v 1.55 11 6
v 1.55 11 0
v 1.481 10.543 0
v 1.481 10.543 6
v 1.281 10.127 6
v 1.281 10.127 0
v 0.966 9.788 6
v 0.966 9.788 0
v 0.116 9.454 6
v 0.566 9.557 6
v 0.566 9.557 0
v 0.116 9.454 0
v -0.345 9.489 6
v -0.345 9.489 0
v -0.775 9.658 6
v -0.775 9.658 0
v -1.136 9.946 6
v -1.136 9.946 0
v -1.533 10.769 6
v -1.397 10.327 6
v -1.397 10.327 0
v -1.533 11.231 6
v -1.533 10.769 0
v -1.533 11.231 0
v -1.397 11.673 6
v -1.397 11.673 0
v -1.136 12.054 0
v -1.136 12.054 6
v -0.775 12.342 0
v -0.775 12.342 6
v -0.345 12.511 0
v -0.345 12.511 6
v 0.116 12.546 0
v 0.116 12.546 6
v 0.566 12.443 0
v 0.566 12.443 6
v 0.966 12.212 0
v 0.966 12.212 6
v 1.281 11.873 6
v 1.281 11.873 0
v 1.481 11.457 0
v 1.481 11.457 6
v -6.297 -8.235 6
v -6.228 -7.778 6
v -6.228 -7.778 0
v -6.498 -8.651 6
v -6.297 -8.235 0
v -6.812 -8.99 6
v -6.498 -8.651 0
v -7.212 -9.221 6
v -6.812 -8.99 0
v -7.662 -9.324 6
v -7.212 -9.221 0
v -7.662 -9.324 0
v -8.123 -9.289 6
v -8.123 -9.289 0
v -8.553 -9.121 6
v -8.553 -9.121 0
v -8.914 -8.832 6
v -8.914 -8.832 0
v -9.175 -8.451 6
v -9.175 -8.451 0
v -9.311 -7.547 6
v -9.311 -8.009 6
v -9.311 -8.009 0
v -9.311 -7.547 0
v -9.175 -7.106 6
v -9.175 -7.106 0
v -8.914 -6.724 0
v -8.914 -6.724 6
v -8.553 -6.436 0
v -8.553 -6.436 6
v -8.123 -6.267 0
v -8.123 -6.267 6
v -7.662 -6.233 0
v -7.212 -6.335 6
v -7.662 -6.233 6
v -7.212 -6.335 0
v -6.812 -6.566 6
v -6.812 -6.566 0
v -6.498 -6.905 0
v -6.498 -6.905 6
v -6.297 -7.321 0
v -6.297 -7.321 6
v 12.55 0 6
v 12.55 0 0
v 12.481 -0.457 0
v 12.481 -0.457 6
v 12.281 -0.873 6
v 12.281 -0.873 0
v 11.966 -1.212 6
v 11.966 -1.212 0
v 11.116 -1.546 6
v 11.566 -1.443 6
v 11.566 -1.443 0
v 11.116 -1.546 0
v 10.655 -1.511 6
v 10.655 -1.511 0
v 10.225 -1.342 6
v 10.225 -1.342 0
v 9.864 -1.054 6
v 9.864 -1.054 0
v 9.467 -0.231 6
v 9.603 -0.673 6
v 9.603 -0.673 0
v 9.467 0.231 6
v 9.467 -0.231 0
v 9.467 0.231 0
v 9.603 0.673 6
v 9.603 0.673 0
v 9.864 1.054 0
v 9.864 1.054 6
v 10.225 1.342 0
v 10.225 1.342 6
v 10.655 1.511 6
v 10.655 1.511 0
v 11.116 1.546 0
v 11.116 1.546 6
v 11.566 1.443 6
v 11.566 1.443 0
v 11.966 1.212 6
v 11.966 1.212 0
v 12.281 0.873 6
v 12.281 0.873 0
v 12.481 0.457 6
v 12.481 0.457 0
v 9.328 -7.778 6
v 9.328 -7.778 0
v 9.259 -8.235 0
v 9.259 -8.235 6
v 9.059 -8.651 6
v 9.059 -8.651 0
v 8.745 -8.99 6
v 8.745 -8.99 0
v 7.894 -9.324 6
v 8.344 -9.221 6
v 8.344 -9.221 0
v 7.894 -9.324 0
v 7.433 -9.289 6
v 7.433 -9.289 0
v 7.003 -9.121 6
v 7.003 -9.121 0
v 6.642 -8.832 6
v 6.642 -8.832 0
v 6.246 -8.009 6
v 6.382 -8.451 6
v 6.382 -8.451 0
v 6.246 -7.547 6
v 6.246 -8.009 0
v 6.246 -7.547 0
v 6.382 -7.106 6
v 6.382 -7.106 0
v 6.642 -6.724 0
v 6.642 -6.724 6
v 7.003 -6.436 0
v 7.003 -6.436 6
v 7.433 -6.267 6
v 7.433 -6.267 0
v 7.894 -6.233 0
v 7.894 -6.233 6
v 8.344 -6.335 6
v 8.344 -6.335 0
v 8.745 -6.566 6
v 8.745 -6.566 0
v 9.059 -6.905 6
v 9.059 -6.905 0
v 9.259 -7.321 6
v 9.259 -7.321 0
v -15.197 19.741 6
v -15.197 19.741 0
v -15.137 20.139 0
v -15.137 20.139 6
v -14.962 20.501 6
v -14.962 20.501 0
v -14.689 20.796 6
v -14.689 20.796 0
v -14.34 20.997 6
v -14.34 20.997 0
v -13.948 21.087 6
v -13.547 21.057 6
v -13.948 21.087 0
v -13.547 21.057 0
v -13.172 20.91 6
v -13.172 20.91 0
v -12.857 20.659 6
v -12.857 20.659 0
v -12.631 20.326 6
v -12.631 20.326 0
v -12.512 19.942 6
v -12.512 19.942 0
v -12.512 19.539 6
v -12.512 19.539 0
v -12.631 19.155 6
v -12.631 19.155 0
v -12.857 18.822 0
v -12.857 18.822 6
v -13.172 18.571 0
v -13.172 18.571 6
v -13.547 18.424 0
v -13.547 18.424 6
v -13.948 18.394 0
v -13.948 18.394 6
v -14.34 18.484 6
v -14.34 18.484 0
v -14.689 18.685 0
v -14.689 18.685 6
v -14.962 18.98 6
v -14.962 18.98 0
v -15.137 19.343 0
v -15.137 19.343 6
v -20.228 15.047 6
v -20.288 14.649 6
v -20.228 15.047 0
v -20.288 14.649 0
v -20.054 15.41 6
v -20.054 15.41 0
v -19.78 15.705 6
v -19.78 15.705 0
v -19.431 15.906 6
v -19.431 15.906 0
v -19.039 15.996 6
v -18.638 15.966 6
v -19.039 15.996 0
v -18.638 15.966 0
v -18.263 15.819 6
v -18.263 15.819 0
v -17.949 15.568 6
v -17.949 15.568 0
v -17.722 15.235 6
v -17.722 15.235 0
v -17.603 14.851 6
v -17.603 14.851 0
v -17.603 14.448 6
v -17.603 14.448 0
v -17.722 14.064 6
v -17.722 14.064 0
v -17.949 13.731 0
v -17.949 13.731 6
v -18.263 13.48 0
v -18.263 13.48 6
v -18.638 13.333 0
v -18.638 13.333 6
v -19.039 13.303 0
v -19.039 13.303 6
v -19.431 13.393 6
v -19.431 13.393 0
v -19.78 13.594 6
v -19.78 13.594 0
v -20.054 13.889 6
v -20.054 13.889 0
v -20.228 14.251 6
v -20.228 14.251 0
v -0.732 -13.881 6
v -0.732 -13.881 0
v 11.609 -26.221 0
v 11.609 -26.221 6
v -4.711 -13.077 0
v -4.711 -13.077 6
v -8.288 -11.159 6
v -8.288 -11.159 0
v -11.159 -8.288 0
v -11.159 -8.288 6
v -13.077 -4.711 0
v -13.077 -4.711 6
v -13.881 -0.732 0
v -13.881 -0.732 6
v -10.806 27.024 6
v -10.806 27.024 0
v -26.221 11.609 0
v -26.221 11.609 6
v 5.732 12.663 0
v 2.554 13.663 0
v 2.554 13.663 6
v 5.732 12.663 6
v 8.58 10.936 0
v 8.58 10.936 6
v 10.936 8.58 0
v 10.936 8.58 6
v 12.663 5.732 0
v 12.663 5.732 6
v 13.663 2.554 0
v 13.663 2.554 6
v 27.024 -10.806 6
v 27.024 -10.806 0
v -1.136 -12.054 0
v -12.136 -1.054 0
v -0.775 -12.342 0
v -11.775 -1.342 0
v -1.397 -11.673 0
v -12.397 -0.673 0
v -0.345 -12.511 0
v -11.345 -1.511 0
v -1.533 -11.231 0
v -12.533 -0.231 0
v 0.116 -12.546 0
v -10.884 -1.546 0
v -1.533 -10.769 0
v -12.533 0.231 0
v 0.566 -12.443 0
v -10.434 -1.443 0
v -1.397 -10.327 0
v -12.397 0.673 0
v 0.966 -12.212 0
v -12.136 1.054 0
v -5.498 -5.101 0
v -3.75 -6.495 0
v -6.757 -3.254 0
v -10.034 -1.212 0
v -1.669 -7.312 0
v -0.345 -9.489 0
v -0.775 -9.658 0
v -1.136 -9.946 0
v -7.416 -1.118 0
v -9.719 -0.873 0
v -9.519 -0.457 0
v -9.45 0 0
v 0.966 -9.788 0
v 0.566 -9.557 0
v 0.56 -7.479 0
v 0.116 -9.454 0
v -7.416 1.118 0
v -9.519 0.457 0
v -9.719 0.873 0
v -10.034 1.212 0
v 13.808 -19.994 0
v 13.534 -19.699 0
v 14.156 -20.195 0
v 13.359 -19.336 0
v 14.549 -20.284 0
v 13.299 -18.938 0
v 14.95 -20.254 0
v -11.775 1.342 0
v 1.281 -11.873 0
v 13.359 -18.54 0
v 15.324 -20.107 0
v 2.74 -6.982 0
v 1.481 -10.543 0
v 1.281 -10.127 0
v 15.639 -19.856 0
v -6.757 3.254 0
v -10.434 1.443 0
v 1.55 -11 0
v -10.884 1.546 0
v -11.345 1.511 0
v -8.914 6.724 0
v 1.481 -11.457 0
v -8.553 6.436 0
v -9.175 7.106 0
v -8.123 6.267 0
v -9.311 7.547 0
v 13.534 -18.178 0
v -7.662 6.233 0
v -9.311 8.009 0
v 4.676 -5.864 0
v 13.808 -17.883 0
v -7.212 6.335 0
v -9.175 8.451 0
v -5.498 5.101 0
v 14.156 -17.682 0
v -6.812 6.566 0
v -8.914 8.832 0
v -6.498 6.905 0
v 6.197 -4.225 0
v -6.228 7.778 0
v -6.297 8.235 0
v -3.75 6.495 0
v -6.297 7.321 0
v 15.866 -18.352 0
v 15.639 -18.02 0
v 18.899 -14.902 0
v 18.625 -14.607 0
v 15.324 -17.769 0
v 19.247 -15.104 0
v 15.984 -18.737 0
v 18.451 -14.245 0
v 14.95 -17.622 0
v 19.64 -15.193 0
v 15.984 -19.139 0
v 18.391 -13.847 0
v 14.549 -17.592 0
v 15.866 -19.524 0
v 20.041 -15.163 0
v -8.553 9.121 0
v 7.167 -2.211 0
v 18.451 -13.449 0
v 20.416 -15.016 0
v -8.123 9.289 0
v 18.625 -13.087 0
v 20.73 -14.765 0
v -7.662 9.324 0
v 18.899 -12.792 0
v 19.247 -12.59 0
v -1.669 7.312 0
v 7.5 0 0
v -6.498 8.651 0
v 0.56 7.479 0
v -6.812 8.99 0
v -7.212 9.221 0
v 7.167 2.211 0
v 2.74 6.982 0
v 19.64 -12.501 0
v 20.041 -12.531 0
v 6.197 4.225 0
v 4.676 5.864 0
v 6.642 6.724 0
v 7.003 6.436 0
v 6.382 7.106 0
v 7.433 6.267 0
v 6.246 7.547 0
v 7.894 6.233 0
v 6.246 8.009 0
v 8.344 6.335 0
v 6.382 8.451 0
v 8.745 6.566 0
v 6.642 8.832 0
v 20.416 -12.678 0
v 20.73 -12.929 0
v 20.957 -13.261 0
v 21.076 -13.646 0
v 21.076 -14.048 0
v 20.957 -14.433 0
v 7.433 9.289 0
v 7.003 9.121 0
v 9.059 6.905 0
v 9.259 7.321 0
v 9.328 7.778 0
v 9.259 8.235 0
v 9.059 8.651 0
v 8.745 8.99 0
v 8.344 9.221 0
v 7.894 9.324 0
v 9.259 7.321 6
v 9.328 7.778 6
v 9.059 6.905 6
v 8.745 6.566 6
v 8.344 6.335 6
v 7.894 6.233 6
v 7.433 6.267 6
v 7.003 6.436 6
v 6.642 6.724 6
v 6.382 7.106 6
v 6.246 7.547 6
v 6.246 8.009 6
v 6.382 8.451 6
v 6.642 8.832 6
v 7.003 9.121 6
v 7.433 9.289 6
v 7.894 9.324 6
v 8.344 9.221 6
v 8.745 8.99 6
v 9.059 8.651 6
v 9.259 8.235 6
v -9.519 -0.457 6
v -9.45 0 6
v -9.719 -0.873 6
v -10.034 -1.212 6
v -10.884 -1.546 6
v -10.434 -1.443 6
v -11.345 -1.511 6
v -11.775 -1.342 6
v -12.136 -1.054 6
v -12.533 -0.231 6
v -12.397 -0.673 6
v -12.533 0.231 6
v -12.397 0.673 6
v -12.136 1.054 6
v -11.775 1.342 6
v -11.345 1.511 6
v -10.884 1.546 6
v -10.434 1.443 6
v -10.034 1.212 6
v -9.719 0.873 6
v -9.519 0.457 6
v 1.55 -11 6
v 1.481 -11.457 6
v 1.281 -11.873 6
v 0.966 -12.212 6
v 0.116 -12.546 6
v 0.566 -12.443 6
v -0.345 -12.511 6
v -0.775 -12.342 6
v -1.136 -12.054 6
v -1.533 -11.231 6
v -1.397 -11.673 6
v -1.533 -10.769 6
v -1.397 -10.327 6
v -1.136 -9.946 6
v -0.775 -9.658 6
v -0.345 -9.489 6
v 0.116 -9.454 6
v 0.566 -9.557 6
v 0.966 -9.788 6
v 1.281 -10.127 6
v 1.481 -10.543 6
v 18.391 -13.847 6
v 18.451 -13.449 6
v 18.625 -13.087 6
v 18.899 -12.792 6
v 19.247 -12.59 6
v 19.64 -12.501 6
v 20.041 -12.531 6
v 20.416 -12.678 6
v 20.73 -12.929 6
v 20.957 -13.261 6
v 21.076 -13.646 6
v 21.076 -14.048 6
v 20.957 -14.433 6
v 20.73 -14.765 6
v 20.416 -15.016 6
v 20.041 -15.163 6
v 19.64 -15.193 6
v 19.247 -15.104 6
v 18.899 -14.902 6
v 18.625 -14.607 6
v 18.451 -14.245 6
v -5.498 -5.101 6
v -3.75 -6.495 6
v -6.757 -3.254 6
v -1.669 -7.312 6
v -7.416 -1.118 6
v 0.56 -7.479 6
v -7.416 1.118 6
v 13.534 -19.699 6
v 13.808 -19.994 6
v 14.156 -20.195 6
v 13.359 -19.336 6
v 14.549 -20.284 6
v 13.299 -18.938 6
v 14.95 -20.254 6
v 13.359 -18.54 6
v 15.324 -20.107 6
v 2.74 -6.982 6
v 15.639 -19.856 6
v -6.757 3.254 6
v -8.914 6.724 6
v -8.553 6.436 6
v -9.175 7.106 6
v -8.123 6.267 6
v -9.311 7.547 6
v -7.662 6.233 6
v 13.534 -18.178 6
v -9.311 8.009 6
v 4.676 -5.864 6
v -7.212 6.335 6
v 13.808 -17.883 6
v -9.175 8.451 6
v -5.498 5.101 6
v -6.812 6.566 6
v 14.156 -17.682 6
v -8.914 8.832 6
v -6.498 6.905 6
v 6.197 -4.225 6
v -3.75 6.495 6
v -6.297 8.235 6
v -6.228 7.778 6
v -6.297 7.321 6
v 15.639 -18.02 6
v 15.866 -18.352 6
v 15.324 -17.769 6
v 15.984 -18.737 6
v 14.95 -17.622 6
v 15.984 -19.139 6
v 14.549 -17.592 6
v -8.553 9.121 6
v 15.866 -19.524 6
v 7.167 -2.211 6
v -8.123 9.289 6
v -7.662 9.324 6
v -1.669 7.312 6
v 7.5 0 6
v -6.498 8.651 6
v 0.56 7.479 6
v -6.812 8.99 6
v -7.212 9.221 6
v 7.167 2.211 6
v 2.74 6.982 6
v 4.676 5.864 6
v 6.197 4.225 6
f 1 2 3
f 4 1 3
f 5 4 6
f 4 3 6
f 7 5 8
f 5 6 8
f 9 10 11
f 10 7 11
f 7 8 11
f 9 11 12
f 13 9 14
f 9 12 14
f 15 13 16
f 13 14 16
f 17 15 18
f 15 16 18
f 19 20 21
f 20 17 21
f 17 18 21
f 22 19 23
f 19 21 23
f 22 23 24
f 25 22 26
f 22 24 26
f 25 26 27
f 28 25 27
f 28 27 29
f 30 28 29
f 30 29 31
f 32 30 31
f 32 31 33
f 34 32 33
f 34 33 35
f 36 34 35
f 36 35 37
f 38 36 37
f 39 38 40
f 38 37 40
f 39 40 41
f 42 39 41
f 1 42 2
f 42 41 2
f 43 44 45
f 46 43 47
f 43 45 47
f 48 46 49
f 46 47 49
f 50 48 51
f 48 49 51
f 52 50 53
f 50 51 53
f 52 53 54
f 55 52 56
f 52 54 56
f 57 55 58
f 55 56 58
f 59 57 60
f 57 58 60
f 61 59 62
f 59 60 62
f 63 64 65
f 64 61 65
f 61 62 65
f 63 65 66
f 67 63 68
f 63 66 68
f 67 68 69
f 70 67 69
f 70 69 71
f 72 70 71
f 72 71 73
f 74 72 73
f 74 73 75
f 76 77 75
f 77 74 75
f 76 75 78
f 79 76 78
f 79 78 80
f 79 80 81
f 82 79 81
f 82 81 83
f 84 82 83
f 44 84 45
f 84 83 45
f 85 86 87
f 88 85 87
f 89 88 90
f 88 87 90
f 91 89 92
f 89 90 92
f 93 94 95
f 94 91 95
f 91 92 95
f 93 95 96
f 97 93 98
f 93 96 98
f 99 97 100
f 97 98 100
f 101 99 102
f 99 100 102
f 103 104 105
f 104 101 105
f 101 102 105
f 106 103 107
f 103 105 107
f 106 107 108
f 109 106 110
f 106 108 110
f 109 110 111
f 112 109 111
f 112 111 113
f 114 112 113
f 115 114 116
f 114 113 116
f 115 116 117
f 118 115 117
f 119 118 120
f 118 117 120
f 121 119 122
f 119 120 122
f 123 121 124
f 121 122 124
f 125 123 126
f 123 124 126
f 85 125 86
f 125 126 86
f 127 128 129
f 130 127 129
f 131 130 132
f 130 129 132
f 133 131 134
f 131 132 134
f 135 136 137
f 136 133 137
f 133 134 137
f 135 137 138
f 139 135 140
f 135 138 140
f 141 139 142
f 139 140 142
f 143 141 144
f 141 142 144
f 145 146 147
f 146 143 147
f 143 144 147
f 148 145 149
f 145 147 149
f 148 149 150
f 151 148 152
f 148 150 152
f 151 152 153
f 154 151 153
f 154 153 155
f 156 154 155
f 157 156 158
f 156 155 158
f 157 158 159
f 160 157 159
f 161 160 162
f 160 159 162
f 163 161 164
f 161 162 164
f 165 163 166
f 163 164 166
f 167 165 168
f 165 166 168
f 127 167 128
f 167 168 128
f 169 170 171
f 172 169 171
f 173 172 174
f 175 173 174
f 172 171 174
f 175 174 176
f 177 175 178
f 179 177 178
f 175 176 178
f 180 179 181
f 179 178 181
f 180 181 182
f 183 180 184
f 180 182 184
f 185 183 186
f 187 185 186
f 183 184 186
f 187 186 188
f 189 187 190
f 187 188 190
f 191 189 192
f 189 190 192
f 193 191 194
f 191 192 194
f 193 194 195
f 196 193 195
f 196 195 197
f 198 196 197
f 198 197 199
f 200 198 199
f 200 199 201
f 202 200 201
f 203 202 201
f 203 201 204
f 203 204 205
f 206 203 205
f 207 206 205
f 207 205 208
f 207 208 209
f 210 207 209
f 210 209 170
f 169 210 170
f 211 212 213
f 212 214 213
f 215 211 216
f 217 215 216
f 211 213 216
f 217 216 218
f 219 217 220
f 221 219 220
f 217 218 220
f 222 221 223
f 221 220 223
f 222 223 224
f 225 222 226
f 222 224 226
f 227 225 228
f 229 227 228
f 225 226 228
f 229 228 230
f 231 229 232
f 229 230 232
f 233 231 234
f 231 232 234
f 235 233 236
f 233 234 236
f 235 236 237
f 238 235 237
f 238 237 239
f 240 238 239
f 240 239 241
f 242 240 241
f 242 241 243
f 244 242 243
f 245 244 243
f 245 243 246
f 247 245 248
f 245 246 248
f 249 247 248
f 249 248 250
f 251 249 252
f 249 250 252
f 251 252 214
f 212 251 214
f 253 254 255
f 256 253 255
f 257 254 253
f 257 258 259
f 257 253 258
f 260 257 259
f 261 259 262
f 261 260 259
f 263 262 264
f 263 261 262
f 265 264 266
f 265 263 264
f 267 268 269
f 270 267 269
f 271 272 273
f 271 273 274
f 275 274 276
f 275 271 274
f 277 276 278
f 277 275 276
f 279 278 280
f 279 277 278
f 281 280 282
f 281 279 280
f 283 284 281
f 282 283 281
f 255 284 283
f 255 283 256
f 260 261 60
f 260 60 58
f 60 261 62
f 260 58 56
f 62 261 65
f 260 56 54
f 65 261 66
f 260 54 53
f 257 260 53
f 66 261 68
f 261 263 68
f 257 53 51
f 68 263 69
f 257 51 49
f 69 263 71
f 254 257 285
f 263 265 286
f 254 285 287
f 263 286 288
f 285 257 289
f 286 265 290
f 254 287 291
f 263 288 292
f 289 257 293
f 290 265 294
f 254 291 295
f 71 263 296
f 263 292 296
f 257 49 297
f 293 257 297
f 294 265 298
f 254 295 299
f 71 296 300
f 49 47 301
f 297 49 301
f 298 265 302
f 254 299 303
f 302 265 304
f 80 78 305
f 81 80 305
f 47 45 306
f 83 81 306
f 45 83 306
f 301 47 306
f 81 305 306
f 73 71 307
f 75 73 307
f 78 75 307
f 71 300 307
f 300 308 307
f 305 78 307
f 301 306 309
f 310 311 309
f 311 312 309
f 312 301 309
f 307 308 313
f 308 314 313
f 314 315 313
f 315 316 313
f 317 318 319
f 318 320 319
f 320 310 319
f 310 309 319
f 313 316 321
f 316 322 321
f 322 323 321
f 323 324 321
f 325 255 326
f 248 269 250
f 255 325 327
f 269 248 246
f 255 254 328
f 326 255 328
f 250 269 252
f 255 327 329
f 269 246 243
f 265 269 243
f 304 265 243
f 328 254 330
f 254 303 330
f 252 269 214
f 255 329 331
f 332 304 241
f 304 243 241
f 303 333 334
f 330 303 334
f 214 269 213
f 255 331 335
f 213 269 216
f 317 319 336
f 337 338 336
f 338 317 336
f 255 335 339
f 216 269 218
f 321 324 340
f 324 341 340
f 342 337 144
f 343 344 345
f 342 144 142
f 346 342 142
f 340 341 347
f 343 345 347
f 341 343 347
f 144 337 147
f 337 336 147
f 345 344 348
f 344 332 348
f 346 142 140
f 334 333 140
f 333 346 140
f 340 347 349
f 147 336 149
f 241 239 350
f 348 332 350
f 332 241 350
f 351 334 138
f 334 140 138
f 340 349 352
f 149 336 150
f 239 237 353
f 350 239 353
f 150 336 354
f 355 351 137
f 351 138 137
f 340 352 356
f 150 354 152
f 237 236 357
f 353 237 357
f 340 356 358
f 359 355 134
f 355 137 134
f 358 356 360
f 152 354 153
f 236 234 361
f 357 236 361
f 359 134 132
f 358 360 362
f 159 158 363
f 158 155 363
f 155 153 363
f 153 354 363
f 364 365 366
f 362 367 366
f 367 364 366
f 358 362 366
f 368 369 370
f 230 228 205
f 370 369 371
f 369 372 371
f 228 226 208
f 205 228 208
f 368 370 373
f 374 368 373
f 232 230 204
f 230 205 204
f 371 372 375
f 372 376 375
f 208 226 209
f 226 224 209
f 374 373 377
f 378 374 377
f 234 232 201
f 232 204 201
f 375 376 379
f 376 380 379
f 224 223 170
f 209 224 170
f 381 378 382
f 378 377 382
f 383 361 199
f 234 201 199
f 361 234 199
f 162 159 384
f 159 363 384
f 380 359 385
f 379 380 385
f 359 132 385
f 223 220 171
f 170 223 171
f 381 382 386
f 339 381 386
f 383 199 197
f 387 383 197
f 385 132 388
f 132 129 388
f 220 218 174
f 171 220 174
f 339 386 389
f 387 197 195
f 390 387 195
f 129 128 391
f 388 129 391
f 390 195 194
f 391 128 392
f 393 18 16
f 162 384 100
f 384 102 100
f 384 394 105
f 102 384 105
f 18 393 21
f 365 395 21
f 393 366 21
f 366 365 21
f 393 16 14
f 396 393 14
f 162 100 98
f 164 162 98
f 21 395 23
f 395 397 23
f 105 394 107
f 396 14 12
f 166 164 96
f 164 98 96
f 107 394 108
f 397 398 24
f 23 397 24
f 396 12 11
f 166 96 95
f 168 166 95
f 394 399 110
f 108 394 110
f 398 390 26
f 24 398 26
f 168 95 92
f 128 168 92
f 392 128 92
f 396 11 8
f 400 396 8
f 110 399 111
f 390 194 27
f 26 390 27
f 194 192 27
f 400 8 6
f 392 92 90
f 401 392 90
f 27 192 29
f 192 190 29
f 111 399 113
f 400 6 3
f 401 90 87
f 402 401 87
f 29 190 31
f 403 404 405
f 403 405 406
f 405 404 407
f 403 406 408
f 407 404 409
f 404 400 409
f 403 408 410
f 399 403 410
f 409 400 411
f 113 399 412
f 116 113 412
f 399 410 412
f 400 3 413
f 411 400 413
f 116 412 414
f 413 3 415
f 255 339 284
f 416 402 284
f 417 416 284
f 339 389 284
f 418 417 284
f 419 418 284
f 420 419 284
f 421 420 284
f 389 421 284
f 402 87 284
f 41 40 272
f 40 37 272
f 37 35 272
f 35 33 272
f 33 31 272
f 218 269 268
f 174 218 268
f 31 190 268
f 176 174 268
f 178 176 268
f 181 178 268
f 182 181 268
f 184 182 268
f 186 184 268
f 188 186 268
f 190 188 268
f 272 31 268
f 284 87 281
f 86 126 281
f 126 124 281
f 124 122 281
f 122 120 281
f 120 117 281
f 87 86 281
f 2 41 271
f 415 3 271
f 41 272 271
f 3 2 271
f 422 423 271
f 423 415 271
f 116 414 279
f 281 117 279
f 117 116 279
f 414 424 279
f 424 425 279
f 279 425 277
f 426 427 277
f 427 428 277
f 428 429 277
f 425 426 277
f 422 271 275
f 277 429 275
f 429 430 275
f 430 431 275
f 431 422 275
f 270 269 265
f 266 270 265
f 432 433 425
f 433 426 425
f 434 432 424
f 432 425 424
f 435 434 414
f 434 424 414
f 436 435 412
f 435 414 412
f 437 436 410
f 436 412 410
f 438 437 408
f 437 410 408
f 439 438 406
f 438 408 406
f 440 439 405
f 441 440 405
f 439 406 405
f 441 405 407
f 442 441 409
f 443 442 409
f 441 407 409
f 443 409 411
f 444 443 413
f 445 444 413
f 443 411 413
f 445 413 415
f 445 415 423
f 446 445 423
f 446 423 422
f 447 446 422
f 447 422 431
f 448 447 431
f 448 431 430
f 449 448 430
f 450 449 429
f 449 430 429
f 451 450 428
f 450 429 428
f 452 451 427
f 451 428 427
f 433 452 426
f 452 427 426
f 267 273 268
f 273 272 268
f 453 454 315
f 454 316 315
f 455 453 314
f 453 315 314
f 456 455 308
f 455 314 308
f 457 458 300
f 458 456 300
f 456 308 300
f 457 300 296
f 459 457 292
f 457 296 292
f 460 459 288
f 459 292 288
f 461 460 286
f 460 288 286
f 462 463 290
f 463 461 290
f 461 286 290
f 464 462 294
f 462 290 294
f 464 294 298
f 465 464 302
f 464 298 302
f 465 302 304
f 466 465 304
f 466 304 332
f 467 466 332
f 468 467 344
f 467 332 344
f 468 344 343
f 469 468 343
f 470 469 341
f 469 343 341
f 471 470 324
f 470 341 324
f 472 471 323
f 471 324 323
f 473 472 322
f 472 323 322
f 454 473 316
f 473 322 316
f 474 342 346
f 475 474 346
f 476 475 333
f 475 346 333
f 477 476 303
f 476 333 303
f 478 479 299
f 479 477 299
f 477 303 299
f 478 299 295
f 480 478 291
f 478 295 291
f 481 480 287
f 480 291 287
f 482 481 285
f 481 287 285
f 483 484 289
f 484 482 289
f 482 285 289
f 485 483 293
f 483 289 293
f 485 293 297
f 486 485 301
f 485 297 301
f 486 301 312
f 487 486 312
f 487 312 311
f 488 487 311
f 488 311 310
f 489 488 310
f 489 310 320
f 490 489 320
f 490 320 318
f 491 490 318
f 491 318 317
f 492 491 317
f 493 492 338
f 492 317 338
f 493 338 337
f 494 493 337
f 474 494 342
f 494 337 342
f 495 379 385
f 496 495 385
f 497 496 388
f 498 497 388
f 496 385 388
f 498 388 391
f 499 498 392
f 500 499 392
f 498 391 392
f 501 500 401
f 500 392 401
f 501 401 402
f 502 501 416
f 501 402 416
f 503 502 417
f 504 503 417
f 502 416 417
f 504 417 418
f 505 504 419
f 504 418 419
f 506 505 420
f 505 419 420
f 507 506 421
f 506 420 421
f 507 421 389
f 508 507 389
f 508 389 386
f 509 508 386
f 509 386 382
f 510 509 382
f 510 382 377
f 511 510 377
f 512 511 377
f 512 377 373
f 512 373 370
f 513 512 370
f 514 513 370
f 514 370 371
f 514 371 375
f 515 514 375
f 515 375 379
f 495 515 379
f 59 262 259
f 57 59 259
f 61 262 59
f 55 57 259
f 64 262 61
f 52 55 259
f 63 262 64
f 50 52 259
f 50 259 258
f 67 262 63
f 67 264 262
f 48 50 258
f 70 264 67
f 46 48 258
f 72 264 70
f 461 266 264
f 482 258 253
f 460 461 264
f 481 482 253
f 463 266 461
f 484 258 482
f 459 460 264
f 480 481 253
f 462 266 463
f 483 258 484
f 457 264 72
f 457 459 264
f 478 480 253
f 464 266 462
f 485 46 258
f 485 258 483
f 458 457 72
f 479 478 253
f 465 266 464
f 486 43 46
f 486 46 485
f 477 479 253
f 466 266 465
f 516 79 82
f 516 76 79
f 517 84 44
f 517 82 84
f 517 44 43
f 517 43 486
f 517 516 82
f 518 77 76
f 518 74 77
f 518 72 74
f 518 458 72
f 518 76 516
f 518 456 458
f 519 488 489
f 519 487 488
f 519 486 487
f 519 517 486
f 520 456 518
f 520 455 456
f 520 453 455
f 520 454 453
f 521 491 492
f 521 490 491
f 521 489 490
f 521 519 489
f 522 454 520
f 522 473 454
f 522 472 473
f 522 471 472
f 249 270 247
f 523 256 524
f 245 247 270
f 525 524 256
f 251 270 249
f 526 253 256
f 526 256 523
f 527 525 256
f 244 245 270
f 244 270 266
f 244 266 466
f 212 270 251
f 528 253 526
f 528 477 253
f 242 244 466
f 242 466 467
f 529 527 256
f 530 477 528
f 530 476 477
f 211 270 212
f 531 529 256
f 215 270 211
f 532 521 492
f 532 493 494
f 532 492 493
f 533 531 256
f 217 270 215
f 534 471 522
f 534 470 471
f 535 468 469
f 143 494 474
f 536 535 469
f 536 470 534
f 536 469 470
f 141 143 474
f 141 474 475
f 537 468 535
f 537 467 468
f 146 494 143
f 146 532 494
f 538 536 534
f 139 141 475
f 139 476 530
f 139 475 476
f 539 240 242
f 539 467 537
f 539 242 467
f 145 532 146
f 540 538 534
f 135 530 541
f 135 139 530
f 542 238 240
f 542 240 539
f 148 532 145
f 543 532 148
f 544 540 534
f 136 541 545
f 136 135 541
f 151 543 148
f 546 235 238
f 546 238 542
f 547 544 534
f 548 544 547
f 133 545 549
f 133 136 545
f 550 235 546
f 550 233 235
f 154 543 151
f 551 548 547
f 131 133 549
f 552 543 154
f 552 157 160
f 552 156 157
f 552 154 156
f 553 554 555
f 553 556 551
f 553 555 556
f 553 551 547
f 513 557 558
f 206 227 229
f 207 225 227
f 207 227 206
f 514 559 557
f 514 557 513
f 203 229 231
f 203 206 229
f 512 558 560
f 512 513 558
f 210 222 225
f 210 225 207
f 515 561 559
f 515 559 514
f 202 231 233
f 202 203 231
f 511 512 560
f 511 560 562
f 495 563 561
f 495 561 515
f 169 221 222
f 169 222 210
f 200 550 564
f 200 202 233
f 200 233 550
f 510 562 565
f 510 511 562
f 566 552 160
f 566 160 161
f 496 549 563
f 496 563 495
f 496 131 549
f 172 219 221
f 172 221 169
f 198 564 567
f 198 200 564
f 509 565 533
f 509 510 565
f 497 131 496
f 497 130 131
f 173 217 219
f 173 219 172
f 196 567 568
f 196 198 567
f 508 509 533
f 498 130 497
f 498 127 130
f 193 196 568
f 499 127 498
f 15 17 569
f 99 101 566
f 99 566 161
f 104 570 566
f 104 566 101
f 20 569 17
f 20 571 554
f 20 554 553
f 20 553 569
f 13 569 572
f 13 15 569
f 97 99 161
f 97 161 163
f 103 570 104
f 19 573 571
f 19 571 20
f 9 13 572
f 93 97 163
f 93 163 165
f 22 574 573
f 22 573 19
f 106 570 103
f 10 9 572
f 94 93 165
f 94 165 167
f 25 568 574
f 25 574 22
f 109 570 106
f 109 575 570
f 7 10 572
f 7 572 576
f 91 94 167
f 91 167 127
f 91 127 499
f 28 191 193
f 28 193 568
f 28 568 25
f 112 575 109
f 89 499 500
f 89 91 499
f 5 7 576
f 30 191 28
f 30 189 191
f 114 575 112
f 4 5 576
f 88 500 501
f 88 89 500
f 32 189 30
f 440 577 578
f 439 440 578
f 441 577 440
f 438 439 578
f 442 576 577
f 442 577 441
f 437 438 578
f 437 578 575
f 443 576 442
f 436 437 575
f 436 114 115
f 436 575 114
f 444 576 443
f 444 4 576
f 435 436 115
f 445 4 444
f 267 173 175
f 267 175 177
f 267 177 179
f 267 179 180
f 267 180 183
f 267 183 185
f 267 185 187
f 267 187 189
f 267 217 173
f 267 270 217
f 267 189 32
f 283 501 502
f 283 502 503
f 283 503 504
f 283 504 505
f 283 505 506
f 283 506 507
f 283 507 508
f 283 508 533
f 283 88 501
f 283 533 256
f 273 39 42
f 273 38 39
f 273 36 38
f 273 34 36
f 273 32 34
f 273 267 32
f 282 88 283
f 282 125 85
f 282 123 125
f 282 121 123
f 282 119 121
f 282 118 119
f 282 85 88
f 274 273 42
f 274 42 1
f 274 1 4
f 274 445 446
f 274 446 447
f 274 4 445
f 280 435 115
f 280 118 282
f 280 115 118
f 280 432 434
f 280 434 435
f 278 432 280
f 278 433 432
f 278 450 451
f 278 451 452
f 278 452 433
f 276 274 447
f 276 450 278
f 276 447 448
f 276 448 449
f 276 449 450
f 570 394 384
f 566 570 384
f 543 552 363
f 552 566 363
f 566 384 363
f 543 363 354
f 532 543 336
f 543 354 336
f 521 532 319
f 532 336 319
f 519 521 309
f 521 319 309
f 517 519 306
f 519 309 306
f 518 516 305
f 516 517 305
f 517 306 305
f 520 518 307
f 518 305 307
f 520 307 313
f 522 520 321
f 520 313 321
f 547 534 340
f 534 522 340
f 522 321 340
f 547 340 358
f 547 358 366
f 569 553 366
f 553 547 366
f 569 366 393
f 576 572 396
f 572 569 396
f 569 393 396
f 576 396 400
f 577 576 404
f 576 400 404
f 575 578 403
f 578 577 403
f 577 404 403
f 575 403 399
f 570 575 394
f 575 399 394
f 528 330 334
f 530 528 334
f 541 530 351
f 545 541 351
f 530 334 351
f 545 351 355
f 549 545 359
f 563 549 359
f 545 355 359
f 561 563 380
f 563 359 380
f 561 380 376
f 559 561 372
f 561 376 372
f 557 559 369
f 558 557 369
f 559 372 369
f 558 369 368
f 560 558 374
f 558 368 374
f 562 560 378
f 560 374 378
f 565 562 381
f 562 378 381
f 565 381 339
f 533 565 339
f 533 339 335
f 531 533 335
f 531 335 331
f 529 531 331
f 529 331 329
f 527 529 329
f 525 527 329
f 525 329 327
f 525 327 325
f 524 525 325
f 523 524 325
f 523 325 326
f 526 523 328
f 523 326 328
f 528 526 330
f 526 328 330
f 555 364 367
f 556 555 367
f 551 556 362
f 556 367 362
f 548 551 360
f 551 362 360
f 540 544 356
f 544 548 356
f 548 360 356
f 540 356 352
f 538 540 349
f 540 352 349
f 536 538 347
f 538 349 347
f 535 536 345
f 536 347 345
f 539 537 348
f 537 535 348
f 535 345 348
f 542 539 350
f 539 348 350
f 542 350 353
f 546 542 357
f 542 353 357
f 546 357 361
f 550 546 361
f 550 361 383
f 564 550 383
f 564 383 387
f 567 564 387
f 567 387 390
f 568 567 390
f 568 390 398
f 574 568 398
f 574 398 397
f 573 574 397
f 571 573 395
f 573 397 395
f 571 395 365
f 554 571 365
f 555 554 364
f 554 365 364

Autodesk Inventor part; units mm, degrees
ref_plane "YZ Plane" through (0, 0, 0) normal (1, 0, 0) x (0, 1, 0)
ref_plane "XZ Plane" through (0, 0, 0) normal (0, 1, 0) x (-1, 0, 0)
ref_plane "XY Plane" through (0, 0, 0) normal (0, 0, 1) x (1, 0, 0)
sketch "스케치1" plane through (0, 0, 0) normal (0, 0, 1) x (1, 0, 0)
  circle A0 centre (-7.7782, -7.7782) radius 1.55 projected
  circle A1 centre (7.7782, -7.7782) radius 1.55 projected
  circle A2 centre (7.7782, 7.7782) radius 1.55 projected
  circle A3 centre (-7.7782, 7.7782) radius 1.55 projected
  circle A4 centre (0, 0) radius 5 projected
  circle A5 centre (0, 0) radius 13.9 projected
  circle A6 centre (0, 11) radius 1.55 projected
  circle A7 centre (11, 0) radius 1.55 projected
  circle A8 centre (0, -11) radius 1.55 projected
  circle A9 centre (-11, 0) radius 1.55 projected
  line L0 (27.0238, -10.8065) -> (11.6088, -26.2214) projected
  line L1 (-10.8065, 27.0238) -> (-26.2214, 11.6088) projected
  line L2 (-10.8065, 27.0238) -> (-26.2214, 11.6088) projected
  line L3 (-10.8065, 27.0238) -> (-26.2214, 11.6088)
  line L4 (-26.2214, 11.6088) -> (11.6088, -26.2214)
  line L5 (11.6088, -26.2214) -> (27.0238, -10.8065)
  line L6 (27.0238, -10.8065) -> (-10.8065, 27.0238)
  line L7 (11.6795, -26.1507) -> (26.9531, -10.8772) projected
  line L8 (26.9531, -10.8772) -> (22.7104, -6.6345) projected
  line L9 (7.4369, -21.908) -> (22.7104, -6.6345) projected
  line L10 (11.6795, -26.1507) -> (7.4369, -21.908) projected
  circle A10 centre (0, 0) radius 7.5 projected
  point P0 (0, 0)
  point P1 (-13.8807, -0.7318)
  point P2 (-0.7318, -13.8807)
  point P3 (13.6634, 2.554)
  point P4 (2.554, 13.6634)
extrude "돌출1" add sketch "스케치1" along normal blind 6 contours A0 L4 A5 L6 A2 | A0 L4 A5 | L4 L1 L6 A5 | A5 L6 L0 L8 L9 L10 L4 | A5 L6 A2 | L10 L9 L8 L0
sketch "스케치2" plane through (0, 0, 0) normal (0, 0, -1) x (-1, 0, 0)
  circle A0 centre (13.847, 19.7406) radius 1.35 projected
  circle A1 centre (18.9382, 14.6494) radius 1.35 projected
  circle A2 centre (-14.6494, -18.9382) radius 1.35 projected
  circle A3 centre (-19.7406, -13.847) radius 1.35 projected
  point P0 (0, 0)
extrude "돌출2" cut sketch "스케치2" against normal blind 6
properties part number "_arm_pti" material "PMMA 플라스틱"
